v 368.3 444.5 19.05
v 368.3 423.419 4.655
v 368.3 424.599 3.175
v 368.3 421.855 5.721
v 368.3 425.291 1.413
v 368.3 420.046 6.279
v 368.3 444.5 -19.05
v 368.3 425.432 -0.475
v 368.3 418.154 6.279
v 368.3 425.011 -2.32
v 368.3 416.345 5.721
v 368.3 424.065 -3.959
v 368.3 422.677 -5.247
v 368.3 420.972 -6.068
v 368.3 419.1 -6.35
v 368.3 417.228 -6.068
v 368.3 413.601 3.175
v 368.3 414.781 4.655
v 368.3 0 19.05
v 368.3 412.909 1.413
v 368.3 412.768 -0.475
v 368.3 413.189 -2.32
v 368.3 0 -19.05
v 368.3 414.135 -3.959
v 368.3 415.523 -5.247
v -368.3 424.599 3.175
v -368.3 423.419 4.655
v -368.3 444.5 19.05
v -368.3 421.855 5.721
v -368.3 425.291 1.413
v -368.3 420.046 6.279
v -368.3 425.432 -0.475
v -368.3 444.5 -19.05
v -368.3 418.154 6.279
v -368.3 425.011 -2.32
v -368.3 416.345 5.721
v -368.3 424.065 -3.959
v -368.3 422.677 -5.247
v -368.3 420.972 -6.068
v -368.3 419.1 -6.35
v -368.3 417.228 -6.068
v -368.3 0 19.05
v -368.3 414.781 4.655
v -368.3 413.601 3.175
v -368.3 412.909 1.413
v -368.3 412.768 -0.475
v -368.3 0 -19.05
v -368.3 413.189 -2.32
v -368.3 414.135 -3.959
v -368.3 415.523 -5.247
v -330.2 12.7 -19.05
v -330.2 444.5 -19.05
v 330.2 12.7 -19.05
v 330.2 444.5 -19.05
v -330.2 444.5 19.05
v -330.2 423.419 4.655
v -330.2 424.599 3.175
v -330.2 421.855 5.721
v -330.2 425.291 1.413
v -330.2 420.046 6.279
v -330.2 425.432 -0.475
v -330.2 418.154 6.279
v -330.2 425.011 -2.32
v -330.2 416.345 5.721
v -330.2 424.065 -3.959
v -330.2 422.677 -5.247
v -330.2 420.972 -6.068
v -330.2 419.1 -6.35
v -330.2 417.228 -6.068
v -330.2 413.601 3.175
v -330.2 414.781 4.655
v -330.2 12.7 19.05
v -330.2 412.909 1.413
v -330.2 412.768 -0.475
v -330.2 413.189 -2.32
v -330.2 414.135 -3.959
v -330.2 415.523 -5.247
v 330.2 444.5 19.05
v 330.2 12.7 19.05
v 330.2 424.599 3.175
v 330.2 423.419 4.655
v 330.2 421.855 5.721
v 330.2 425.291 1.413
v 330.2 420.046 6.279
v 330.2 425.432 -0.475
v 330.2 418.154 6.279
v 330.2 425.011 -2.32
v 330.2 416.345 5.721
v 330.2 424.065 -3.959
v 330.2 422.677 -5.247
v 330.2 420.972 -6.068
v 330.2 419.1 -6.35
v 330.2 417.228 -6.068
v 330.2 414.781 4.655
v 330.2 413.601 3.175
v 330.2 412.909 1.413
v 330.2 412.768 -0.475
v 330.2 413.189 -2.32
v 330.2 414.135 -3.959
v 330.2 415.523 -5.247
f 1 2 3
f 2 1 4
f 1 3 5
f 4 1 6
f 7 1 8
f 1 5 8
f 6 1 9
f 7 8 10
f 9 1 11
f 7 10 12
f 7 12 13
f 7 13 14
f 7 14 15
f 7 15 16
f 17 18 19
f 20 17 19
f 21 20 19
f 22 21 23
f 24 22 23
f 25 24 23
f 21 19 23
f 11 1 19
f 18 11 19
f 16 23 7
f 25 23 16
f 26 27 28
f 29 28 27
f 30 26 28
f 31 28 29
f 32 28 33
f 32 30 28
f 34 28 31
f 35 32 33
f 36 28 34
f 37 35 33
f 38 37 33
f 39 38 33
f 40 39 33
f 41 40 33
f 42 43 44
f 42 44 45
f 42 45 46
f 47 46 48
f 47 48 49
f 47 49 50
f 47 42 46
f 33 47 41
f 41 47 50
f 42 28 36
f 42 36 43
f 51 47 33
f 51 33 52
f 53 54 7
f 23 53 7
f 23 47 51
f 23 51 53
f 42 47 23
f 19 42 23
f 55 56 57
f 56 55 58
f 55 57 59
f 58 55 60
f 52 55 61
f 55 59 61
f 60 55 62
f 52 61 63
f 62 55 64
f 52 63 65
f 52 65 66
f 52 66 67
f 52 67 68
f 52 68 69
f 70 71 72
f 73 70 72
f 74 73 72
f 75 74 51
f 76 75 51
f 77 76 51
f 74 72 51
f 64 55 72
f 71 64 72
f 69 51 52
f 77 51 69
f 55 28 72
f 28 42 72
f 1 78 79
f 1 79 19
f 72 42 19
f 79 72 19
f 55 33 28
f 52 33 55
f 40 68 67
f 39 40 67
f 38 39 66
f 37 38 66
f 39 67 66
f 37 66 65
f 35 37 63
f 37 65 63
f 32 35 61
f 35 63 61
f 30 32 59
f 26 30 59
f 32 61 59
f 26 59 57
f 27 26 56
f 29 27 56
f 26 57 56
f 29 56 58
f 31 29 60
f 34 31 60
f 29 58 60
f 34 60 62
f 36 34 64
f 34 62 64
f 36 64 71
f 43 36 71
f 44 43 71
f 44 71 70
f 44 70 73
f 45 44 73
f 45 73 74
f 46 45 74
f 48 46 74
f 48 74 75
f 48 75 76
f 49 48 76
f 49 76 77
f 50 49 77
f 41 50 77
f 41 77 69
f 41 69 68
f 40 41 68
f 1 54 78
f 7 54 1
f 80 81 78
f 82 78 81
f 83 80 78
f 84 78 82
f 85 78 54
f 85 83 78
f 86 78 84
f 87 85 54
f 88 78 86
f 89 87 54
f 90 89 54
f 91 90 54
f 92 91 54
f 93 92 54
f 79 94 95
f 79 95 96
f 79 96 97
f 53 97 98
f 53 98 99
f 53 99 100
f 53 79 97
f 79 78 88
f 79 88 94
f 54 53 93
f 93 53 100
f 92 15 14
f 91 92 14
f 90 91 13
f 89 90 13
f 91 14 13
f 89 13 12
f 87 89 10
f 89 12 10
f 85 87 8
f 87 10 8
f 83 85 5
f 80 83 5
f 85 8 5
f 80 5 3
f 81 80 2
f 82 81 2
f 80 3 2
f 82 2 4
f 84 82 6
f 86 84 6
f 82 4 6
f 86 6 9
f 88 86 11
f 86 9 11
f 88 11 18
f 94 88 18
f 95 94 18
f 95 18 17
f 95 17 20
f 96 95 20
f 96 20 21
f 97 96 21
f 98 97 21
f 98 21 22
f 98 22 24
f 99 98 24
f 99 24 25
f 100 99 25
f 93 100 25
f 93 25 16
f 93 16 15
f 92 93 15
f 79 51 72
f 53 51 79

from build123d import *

# Parameters (mm, degrees)
SKETCH2_W           = 736.6
SKETCH2_H           = 38.1
BOSS_EXTRUDE1_DEPTH = 12.7
SKETCH3_W           = 38.1
SKETCH3_H           = 38.1
BOSS_EXTRUDE2_DEPTH = 431.8
SKETCH4_R           = 6.35
CUT_EXTRUDE1_DEPTH  = 737.6


with BuildPart() as part:
    # Sketch2 → Boss-Extrude1 (new body)
    with BuildSketch(Plane(origin=(0, 0, 0), x_dir=(1, 0, 0), z_dir=(0, 1, 0))):
        Rectangle(SKETCH2_W, SKETCH2_H)
    extrude(amount=BOSS_EXTRUDE1_DEPTH)

    # Sketch3 → Boss-Extrude2 (add)
    with BuildSketch(Plane(origin=(0, 12.7, 0), x_dir=(1, 0, 0), z_dir=(0, 1, 0))):
        with Locations((-349.25, 0)):
            Rectangle(SKETCH3_W, SKETCH3_H)
        with Locations((349.25, 0)):
            Rectangle(SKETCH3_W, SKETCH3_H)
    extrude(amount=BOSS_EXTRUDE2_DEPTH)

    # Sketch4 → Cut-Extrude1 (cut, through all)
    with BuildSketch(Plane(origin=(368.3, 0, 0), x_dir=(0, 0, -1), z_dir=(1, 0, 0))):
        with Locations((0, 419.1)):
            Circle(SKETCH4_R)
    extrude(amount=-CUT_EXTRUDE1_DEPTH, mode=Mode.SUBTRACT)


solid = part.part
